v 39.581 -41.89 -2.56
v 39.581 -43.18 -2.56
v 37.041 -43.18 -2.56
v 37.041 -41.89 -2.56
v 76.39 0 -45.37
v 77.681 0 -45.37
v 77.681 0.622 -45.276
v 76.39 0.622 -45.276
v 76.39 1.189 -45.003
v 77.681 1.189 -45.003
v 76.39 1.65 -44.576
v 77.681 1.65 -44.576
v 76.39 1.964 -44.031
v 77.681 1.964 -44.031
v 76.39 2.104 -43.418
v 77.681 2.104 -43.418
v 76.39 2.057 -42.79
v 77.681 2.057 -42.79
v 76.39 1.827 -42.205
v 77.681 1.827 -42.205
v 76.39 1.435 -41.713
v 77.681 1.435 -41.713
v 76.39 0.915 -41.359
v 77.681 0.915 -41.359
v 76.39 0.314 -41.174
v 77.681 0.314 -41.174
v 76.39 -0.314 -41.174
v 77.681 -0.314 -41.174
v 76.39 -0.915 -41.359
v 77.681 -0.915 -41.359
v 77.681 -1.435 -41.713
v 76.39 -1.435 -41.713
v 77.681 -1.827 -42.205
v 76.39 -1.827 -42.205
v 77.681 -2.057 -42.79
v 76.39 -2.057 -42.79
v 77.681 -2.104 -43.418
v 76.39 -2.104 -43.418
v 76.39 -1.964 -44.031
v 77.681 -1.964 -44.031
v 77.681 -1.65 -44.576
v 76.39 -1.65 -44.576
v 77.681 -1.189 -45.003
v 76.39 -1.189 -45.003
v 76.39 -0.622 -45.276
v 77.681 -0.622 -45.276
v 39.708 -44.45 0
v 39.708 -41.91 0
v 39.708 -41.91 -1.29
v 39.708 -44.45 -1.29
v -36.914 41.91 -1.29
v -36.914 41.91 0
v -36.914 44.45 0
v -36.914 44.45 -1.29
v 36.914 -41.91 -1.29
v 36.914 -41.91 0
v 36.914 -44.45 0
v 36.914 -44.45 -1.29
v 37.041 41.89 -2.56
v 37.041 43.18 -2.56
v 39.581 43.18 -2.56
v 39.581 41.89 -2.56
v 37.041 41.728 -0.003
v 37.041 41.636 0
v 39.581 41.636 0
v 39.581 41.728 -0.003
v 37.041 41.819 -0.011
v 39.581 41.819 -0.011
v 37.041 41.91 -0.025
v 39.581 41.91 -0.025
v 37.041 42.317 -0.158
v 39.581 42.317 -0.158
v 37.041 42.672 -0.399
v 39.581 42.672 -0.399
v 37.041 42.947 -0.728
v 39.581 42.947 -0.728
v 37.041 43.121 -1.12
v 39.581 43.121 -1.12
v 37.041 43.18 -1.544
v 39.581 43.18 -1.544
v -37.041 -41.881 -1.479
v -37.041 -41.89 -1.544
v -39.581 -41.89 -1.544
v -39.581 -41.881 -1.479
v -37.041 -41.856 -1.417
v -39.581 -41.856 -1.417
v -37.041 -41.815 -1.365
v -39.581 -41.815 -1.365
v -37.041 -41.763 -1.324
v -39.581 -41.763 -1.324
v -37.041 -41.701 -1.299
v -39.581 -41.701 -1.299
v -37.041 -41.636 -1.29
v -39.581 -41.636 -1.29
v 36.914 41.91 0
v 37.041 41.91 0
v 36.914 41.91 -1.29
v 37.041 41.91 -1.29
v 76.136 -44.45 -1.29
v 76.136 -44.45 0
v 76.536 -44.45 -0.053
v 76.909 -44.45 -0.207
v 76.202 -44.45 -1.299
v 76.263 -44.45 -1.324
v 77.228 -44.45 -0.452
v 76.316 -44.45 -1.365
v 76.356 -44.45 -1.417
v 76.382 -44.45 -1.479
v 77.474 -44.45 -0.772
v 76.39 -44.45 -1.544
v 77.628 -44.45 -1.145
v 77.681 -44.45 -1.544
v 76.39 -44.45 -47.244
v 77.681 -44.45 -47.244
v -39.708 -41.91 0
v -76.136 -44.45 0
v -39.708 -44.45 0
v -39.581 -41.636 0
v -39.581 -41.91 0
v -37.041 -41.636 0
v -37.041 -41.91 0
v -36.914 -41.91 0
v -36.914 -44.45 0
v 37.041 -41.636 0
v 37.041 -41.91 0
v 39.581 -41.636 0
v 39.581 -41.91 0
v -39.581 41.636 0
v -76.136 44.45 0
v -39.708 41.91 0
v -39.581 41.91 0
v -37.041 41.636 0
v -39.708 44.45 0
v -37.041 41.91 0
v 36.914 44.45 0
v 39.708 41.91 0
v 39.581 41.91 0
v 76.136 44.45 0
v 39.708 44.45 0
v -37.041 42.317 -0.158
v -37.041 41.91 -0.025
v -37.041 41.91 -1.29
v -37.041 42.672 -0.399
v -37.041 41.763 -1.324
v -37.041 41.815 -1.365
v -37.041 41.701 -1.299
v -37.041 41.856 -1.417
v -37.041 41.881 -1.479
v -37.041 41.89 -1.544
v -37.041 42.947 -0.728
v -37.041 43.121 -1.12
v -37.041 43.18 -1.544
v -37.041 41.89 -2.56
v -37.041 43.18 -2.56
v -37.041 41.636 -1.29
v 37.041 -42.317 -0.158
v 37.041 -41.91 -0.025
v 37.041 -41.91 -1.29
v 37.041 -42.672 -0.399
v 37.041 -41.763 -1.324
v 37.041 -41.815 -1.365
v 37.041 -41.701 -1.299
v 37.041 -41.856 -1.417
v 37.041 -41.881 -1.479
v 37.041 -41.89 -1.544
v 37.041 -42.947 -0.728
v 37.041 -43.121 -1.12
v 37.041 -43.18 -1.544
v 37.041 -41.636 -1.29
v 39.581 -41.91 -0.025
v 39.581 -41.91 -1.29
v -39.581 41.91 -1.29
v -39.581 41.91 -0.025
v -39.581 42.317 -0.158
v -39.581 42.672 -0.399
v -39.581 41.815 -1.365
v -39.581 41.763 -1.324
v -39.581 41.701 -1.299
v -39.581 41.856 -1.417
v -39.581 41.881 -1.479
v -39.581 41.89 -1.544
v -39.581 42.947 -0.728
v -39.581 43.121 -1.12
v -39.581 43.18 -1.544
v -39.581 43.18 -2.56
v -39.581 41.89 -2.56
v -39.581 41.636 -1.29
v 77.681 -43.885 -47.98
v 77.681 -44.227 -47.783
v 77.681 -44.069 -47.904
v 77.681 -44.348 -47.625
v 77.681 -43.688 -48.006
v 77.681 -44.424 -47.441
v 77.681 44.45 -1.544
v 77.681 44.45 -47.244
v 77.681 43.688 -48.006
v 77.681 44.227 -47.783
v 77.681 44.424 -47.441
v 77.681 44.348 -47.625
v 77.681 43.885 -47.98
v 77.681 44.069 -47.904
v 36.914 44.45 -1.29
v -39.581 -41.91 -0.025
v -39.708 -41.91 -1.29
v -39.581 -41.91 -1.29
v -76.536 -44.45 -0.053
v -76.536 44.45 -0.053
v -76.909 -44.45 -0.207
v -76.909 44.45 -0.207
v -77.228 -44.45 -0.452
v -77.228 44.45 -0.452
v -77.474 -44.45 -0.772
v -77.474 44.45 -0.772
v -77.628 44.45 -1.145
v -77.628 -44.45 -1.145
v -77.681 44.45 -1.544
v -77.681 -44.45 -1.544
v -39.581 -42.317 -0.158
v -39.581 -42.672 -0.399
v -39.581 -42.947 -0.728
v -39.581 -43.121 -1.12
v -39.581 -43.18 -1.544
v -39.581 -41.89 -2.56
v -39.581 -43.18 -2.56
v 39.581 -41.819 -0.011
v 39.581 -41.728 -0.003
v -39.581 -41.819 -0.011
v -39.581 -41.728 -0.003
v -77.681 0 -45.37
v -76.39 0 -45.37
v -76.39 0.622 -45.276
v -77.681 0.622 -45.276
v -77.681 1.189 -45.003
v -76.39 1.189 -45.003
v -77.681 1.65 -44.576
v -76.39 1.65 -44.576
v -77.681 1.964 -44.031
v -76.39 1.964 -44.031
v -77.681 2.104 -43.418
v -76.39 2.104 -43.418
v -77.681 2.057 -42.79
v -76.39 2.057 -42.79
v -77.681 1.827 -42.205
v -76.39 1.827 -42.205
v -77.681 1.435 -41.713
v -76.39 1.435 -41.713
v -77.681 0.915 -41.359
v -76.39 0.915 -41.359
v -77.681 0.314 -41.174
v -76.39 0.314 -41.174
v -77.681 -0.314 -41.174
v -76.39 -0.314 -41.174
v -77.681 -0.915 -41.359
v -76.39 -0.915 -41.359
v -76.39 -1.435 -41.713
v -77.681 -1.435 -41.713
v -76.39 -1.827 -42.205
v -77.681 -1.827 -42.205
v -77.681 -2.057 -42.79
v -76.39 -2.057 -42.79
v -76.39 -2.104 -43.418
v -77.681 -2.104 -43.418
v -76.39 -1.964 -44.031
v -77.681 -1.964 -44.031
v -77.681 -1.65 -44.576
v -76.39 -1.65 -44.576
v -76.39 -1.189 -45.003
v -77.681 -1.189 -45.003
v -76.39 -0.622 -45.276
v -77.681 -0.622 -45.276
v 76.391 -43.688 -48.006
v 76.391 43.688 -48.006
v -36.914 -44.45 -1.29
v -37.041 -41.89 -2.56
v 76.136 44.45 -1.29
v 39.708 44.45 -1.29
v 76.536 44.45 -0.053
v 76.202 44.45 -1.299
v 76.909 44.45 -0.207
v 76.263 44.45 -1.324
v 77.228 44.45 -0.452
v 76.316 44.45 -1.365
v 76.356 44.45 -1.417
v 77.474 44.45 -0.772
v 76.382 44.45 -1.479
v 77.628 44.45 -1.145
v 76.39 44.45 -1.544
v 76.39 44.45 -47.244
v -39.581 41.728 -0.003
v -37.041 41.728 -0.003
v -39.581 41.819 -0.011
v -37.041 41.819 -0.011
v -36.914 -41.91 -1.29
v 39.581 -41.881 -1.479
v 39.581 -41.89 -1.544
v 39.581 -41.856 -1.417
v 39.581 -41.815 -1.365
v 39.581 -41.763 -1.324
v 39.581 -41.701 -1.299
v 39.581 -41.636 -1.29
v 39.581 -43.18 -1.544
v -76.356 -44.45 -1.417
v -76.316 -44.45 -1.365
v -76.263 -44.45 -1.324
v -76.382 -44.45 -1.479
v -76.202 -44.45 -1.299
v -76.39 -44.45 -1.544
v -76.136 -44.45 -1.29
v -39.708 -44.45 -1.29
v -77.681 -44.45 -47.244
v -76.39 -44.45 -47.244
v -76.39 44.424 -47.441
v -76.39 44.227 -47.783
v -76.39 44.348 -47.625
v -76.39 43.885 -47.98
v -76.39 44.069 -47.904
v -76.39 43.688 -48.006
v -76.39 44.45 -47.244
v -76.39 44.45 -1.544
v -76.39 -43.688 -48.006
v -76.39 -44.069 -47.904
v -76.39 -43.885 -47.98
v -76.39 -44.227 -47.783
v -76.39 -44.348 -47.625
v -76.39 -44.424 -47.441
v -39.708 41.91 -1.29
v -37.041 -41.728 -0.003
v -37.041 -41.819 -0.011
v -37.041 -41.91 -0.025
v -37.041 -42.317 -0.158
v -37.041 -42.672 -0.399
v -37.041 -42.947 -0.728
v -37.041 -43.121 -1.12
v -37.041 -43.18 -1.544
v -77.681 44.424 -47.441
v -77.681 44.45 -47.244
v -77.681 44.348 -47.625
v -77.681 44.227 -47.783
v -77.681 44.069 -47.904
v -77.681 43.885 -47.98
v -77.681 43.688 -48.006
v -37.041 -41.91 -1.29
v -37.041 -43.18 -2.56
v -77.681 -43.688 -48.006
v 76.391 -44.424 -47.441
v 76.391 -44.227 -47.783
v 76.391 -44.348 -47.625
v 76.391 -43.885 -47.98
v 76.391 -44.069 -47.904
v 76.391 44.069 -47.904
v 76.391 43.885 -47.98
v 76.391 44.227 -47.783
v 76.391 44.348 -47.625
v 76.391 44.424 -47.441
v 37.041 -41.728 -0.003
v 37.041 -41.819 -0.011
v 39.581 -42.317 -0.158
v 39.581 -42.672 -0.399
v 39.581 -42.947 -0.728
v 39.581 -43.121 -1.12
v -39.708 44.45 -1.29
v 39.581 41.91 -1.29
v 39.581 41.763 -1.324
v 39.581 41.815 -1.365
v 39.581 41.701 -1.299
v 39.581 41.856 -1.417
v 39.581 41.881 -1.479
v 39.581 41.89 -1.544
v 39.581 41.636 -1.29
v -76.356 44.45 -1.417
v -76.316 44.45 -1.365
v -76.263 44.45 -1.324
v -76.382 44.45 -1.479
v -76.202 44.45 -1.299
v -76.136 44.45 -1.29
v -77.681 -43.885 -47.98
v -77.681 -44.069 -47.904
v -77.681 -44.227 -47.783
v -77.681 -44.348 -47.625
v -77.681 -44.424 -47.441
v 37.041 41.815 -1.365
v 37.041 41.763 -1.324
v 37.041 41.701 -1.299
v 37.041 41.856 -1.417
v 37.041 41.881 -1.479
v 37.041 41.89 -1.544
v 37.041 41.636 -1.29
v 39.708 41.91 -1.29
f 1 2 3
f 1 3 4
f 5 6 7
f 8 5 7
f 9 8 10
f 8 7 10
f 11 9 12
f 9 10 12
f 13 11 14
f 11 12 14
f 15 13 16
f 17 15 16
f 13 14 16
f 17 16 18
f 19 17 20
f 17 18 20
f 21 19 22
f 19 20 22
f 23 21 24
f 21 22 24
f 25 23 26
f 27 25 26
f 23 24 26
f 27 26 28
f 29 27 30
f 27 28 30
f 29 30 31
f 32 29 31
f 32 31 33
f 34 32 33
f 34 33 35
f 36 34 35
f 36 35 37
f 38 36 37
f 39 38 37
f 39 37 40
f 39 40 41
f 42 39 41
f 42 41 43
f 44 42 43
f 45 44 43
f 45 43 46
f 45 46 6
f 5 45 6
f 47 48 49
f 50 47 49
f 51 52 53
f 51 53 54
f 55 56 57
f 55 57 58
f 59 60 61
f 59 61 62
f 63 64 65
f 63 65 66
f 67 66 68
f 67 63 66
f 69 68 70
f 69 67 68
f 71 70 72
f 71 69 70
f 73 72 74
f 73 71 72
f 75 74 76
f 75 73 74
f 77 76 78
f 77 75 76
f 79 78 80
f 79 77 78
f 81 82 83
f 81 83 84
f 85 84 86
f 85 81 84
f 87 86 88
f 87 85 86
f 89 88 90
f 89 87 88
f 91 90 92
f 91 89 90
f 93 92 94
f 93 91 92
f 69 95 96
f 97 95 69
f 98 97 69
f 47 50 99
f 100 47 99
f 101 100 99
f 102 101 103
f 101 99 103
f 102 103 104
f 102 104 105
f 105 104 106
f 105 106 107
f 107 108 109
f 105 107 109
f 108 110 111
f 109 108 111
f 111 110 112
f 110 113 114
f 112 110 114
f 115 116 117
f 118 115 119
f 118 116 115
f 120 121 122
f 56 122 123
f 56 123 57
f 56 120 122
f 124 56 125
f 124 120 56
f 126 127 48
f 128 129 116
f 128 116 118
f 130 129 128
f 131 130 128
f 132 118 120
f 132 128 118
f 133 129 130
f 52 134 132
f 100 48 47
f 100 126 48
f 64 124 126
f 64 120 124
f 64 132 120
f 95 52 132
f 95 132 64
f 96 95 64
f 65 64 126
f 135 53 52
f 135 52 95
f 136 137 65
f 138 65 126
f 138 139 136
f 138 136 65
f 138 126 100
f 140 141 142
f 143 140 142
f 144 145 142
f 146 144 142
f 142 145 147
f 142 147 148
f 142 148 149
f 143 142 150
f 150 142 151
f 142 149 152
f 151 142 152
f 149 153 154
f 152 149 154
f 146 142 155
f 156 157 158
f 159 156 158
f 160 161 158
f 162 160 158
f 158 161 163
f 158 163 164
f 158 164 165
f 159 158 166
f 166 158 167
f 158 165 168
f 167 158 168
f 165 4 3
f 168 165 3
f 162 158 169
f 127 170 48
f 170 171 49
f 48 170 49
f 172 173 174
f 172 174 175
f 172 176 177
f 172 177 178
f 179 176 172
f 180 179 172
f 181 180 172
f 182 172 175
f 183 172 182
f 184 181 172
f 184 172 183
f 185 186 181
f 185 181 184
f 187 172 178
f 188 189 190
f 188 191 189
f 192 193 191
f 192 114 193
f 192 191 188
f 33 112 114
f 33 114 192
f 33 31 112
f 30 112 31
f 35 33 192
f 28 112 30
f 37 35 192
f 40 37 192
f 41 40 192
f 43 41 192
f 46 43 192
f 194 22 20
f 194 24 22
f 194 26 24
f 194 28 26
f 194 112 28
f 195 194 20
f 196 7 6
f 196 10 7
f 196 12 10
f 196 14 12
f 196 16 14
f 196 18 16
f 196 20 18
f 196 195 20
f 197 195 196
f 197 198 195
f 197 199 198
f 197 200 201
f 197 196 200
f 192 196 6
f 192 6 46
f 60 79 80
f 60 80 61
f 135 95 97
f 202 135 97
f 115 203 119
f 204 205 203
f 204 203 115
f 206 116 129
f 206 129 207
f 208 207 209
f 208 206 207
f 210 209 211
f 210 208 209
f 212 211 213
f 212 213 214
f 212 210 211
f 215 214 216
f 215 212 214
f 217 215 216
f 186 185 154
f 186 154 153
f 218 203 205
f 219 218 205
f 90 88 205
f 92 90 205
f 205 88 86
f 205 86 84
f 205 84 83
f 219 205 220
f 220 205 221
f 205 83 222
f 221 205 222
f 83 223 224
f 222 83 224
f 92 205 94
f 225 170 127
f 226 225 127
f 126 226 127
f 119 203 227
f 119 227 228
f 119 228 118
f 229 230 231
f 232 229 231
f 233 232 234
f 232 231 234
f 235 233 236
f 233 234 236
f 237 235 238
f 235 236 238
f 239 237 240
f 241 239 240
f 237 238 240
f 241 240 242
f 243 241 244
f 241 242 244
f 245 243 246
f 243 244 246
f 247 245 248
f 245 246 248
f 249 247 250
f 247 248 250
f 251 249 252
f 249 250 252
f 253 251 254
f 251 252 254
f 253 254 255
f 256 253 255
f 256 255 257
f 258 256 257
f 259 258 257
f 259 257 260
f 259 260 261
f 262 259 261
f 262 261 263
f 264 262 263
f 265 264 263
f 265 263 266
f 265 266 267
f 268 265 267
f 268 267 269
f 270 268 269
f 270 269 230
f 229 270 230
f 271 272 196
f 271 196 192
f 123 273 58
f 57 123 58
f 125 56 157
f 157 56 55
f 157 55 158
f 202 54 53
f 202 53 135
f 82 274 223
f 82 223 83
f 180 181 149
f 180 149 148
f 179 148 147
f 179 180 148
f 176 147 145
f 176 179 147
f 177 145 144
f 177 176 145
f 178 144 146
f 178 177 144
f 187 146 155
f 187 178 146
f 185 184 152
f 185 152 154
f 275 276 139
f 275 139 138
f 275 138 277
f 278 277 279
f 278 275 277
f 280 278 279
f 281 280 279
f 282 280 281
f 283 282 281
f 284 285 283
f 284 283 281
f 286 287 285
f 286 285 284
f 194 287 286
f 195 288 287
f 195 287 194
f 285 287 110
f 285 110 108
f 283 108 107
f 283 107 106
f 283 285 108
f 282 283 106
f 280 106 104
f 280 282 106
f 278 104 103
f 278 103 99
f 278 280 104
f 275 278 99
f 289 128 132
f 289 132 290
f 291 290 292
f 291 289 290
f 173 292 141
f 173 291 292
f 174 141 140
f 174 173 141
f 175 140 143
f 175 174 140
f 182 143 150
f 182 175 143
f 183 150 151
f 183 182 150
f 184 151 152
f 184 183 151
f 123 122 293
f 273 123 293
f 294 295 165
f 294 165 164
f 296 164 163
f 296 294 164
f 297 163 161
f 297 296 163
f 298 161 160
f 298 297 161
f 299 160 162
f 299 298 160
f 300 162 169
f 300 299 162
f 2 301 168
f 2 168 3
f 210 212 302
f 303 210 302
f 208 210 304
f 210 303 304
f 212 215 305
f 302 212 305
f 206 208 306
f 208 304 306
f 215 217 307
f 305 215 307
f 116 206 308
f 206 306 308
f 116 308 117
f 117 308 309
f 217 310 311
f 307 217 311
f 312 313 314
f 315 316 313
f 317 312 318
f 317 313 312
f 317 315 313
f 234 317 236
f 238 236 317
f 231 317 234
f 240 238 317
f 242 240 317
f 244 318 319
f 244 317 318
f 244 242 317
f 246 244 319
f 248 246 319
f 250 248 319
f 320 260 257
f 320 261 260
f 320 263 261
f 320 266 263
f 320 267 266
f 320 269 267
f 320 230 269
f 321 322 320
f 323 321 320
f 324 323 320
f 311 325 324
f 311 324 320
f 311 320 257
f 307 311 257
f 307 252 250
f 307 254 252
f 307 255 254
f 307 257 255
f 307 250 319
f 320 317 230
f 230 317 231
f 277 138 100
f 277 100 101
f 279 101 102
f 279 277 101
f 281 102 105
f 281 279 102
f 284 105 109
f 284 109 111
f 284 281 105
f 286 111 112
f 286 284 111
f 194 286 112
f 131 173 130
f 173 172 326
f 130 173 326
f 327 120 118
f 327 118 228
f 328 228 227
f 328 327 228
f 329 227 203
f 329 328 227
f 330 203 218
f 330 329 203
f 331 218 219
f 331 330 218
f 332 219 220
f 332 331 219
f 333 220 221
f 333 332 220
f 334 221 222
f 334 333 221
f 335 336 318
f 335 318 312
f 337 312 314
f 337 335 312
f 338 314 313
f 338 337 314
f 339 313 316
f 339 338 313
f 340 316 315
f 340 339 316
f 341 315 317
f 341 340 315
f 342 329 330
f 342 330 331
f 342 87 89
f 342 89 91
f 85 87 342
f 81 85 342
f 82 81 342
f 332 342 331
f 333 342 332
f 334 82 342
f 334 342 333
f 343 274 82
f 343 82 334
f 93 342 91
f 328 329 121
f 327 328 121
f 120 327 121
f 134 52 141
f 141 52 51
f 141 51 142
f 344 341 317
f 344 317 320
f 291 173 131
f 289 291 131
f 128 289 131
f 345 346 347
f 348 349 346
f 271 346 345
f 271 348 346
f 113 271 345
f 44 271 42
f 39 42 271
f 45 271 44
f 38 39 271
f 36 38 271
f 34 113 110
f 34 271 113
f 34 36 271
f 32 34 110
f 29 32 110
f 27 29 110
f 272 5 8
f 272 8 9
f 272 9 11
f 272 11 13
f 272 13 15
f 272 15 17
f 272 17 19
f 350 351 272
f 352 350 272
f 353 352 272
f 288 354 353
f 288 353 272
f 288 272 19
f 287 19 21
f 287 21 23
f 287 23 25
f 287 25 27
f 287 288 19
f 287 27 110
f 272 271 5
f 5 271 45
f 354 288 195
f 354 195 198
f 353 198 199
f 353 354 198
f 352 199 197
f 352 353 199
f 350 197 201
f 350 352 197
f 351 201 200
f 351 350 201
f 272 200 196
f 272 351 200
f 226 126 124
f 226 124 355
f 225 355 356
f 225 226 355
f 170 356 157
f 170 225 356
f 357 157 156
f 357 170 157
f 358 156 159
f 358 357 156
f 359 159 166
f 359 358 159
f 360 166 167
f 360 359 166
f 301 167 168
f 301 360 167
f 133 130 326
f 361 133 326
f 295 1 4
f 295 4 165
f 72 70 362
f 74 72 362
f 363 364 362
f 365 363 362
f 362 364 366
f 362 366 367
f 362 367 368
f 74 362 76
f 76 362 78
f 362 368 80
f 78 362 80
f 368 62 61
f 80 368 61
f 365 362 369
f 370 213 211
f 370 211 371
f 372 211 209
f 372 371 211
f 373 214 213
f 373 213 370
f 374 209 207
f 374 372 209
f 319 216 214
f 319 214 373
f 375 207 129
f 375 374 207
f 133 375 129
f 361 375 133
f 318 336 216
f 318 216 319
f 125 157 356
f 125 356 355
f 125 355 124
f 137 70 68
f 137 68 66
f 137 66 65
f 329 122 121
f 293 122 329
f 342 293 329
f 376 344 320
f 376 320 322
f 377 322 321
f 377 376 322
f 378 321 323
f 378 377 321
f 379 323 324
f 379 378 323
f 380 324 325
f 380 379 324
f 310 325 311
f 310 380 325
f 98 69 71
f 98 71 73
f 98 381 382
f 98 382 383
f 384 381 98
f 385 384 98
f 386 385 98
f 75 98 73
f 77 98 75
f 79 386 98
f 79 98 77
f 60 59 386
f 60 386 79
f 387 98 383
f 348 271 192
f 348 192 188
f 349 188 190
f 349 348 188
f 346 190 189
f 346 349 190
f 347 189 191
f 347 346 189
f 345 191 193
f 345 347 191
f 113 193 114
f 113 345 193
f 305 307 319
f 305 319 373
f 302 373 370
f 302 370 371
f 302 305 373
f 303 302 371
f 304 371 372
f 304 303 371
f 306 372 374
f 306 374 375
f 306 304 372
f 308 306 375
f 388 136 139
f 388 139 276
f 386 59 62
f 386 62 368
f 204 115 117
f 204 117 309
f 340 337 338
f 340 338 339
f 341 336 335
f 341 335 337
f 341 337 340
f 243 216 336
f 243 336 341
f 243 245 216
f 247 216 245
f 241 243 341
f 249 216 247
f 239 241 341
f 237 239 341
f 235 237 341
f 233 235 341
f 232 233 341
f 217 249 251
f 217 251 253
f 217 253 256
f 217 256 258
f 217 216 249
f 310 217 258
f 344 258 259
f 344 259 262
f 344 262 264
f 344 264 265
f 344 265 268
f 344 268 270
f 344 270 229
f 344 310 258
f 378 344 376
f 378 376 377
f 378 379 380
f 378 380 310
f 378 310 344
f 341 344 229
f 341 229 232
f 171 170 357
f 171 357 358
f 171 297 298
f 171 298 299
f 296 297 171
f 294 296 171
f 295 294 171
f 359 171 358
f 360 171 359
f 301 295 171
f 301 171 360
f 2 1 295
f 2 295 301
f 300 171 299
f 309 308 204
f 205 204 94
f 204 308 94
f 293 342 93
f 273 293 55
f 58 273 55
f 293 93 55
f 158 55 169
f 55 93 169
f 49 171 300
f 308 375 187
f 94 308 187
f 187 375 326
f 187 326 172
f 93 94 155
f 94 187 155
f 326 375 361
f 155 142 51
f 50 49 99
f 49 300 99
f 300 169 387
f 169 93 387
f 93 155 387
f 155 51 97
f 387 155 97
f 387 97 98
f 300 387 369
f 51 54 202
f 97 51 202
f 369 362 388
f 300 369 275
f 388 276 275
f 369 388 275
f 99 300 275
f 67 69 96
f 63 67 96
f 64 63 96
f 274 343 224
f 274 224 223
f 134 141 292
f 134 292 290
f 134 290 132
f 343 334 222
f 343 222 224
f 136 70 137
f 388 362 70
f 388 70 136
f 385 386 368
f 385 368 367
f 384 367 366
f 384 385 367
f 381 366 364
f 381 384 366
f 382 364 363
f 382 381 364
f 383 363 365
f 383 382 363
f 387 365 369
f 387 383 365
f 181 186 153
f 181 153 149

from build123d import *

# Parameters (mm, degrees)
SKETCH1_W                                    = 152.4
SKETCH1_H                                    = 88.9
BASE_FLANGE1_DEPTH                           = 1.29032
EDGE_FLANGE1_STRIP_W                         = 5.85978
EDGE_FLANGE1_STRIP_H                         = 1.29032
EDGE_FLANGE1_STRIP_CUT_DEPTH                 = 88.9
EDGE_FLANGE1_STRIP_2_W                       = 5.85978
EDGE_FLANGE1_STRIP_2_H                       = 1.29032
EDGE_FLANGE1_STRIP_CUT_2_DEPTH               = 88.9
EDGE_FLANGE1_DEPTH                           = 88.9
EDGE_FLANGE1_BEND_DEPTH                      = 88.9
F_4_22MM_HOLE_FOR_M3_CLINCH_NUT_D            = 4.22
BREAK_CORNER1_START                          = -77.68082
BREAK_CORNER1_DEPTH                          = 155.36164
CUT_THICKEN1_START                           = 41.91
CUT_THICKEN1_OUTLINE_W                       = 0.127
CUT_THICKEN1_OUTLINE_H                       = 1.29032
CUT_THICKEN1_DEPTH                           = 2.54
CUT_THICKEN2_START                           = 41.91
CUT_THICKEN2_OUTLINE_W                       = 0.127
CUT_THICKEN2_OUTLINE_H                       = 1.29032
CUT_THICKEN2_DEPTH                           = 2.54
MIRROR7_START                                = 41.91
MIRROR7_COPY_1_SKETCH_W                      = 0.127
MIRROR7_COPY_1_SKETCH_H                      = 1.29032
MIRROR7_COPY_1_DEPTH                         = 2.54
MIRROR7_COPY_2_SKETCH_W                      = 0.127
MIRROR7_COPY_2_SKETCH_H                      = 1.29032
MIRROR7_COPY_2_DEPTH                         = 2.54
MOVE_FACE1_BY                                = 1.27
MOVE_FACE1_2_BY                              = 1.27
MOVE_FACE1_3_BY                              = 1.27
MOVE_FACE1_4_BY                              = 1.27
EDGE_FLANGE2_STRIP_W                         = 5.66928
EDGE_FLANGE2_STRIP_H                         = 1.29032
EDGE_FLANGE2_STRIP_CUT_DEPTH                 = 2.54
EDGE_FLANGE2_STRIP_2_W                       = 5.66928
EDGE_FLANGE2_STRIP_2_H                       = 1.29032
EDGE_FLANGE2_STRIP_CUT_2_DEPTH               = 2.54
EDGE_FLANGE2_STRIP_3_W                       = 5.66928
EDGE_FLANGE2_STRIP_3_H                       = 1.29032
EDGE_FLANGE2_STRIP_CUT_3_DEPTH               = 2.54
EDGE_FLANGE2_STRIP_4_W                       = 5.66928
EDGE_FLANGE2_STRIP_4_H                       = 1.29032
EDGE_FLANGE2_STRIP_CUT_4_DEPTH               = 2.54
EDGE_FLANGE2_DEPTH                           = 2.54
EDGE_FLANGE2_BEND_DEPTH                      = 2.54
EDGE_FLANGE2_BEND_2_DEPTH                    = 2.54
EDGE_FLANGE2_BEND_3_DEPTH                    = 2.54
CHANGE_START                                 = -77.68082
CHANGE_NOTE_FOR_REVH_TO_ADD_010_CLEARA_DEPTH = 155.36164


# Read off the part's stored shape, not the designer's step: Break-Corner1, Cut-Thicken1, Cut-Thicken2, change note for revH to add .010" clearance
# Sheet-metal steps are written as plain solids
with BuildPart() as part:
    # Sketch1 → Base-Flange1 (new body)
    with BuildSketch(Plane.XY):
        Rectangle(SKETCH1_W, SKETCH1_H)
    extrude(amount=-BASE_FLANGE1_DEPTH)

    # Edge-Flange1 strip (across the edge) → Edge-Flange1 strip cut (cut)
    with BuildSketch(Plane(origin=(-76.3905, -44.45, -1.29032), x_dir=(1, 0, 0), z_dir=(0, 1, 0))):
        with Locations((-2.67589, -0.64516)):
            Rectangle(EDGE_FLANGE1_STRIP_W, EDGE_FLANGE1_STRIP_H)
    extrude(amount=EDGE_FLANGE1_STRIP_CUT_DEPTH, mode=Mode.SUBTRACT)

    # Edge-Flange1 strip 2 (across the edge) → Edge-Flange1 strip cut 2 (cut)
    with BuildSketch(Plane(origin=(76.3905, 44.45, -1.29032), x_dir=(-1, 0, 0), z_dir=(0, -1, 0))):
        with Locations((-2.67589, -0.64516)):
            Rectangle(EDGE_FLANGE1_STRIP_2_W, EDGE_FLANGE1_STRIP_2_H)
    extrude(amount=EDGE_FLANGE1_STRIP_CUT_2_DEPTH, mode=Mode.SUBTRACT)

    # Edge-Flange1 section (across the edge) → Edge-Flange1 (add)
    with BuildSketch(Plane(origin=(-76.3905, -44.45, -1.29032), x_dir=(1, 0, 0), z_dir=(0, 1, 0))):
        with BuildLine():
            Line((-1.29032, 0.254), (-1.29032, 46.96968))
            Line((-1.29032, 46.96968), (0, 46.96968))
            Line((0, 46.96968), (0, 0.254))
            ThreePointArc((0, 0.254), (0.074394878, 0.074394878), (0.254, 0))
            Line((0.254, 0), (0.254, -1.29032))
            ThreePointArc((0.254, -1.29032), (-0.837999144, -0.837999144), (-1.29032, 0.254))
        make_face()
    extrude(amount=EDGE_FLANGE1_DEPTH)

    # Edge-Flange1 section 2 (across the edge) → Edge-Flange1 bend (add)
    with BuildSketch(Plane(origin=(76.3905, 44.45, -1.29032), x_dir=(-1, 0, 0), z_dir=(0, -1, 0))):
        with BuildLine():
            Line((-1.29032, 0.254), (-1.29032, 46.96968))
            Line((-1.29032, 46.96968), (0, 46.96968))
            Line((0, 46.96968), (0, 0.254))
            ThreePointArc((0, 0.254), (0.074394878, 0.074394878), (0.254, 0))
            Line((0.254, 0), (0.254, -1.29032))
            ThreePointArc((0.254, -1.29032), (-0.837999144, -0.837999144), (-1.29032, 0.254))
        make_face()
    extrude(amount=EDGE_FLANGE1_BEND_DEPTH)

    # Ø4.22mm hole for M3 Clinch nut (through all)
    with Locations(Plane.ZY.offset(77.68082)):
        with Locations((-43.26, 0)):
            f_4_22mm_hole_for_m3_clinch_nut = Hole(F_4_22MM_HOLE_FOR_M3_CLINCH_NUT_D / 2)

    # Mirror1: Ø4.22mm hole for M3 Clinch nut across plane
    add(f_4_22mm_hole_for_m3_clinch_nut.mirror(Plane(origin=(0, 0, 0), x_dir=(0, 0, 1), z_dir=(1, 0, 0))), mode=Mode.SUBTRACT)

    # Break-Corner1 outline → Break-Corner1 (cut)
    with BuildSketch(Plane.YZ.offset(BREAK_CORNER1_START)):
        with BuildLine():
            Line((44.45, -48.26), (44.45, -47.498))
            ThreePointArc((44.45, -47.498), (44.226815367, -48.036815367), (43.688, -48.26))
            Line((43.688, -48.26), (44.45, -48.26))
        make_face()
        with BuildLine():
            Line((-44.45, -48.26), (-43.688, -48.26))
            ThreePointArc((-43.688, -48.26), (-44.226815367, -48.036815367), (-44.45, -47.498))
            Line((-44.45, -47.498), (-44.45, -48.26))
        make_face()
    extrude(amount=BREAK_CORNER1_DEPTH, mode=Mode.SUBTRACT)

    # Cut-Thicken1 outline → Cut-Thicken1 (cut)
    with BuildSketch(Plane(origin=(0, 0, 0), x_dir=(1, 0, 0), z_dir=(0, 1, 0)).offset(CUT_THICKEN1_START)):
        with Locations((36.97732, 0.64516)):
            Rectangle(CUT_THICKEN1_OUTLINE_W, CUT_THICKEN1_OUTLINE_H)
    cut_thicken1 = extrude(amount=CUT_THICKEN1_DEPTH, mode=Mode.SUBTRACT)

    # Cut-Thicken2 outline → Cut-Thicken2 (cut)
    with BuildSketch(Plane(origin=(0, 0, 0), x_dir=(1, 0, 0), z_dir=(0, 1, 0)).offset(CUT_THICKEN2_START)):
        with Locations((39.64432, 0.64516)):
            Rectangle(CUT_THICKEN2_OUTLINE_W, CUT_THICKEN2_OUTLINE_H)
    cut_thicken2 = extrude(amount=CUT_THICKEN2_DEPTH, mode=Mode.SUBTRACT)

    # Mirror6: Cut-Thicken1, Cut-Thicken2 across plane
    add(cut_thicken1.mirror(Plane(origin=(0, 0, 0), x_dir=(0, 0, 1), z_dir=(1, 0, 0))), mode=Mode.SUBTRACT)
    add(cut_thicken2.mirror(Plane(origin=(0, 0, 0), x_dir=(0, 0, 1), z_dir=(1, 0, 0))), mode=Mode.SUBTRACT)

    # Mirror7: Cut-Thicken1, Cut-Thicken2 across plane
    add(cut_thicken1.mirror(Plane.ZX), mode=Mode.SUBTRACT)
    add(cut_thicken2.mirror(Plane.ZX), mode=Mode.SUBTRACT)

    # Mirror7 copy 1 sketch → Mirror7 copy 1 (cut)
    with BuildSketch(Plane(origin=(0, 0, 0), x_dir=(-1, 0, 0), z_dir=(0, -1, 0)).offset(MIRROR7_START)):
        with Locations((36.97732, 0.64516)):
            Rectangle(MIRROR7_COPY_1_SKETCH_W, MIRROR7_COPY_1_SKETCH_H)
    extrude(amount=MIRROR7_COPY_1_DEPTH, mode=Mode.SUBTRACT)

    # Mirror7 copy 2 sketch → Mirror7 copy 2 (cut)
    with BuildSketch(Plane(origin=(0, 0, 0), x_dir=(-1, 0, 0), z_dir=(0, -1, 0)).offset(MIRROR7_START)):
        with Locations((39.64432, 0.64516)):
            Rectangle(MIRROR7_COPY_2_SKETCH_W, MIRROR7_COPY_2_SKETCH_H)
    extrude(amount=MIRROR7_COPY_2_DEPTH, mode=Mode.SUBTRACT)

    # Move Face1: a face moved inward by 1.27
    extrude(part.faces().sort_by_distance((-38.31082, -44.45, -0.64516))[0], amount=MOVE_FACE1_BY, dir=(0, 1, 0), mode=Mode.SUBTRACT)

    # Move Face1 2: a face moved inward by 1.27
    extrude(part.faces().sort_by_distance((38.31082, -44.45, -0.64516))[0], amount=MOVE_FACE1_2_BY, dir=(0, 1, 0), mode=Mode.SUBTRACT)

    # Move Face1 3: a face moved inward by 1.27
    extrude(part.faces().sort_by_distance((-38.31082, 44.45, -0.64516))[0], amount=MOVE_FACE1_3_BY, dir=(0, -1, 0), mode=Mode.SUBTRACT)

    # Move Face1 4: a face moved inward by 1.27
    extrude(part.faces().sort_by_distance((38.31082, 44.45, -0.64516))[0], amount=MOVE_FACE1_4_BY, dir=(0, -1, 0), mode=Mode.SUBTRACT)

    # Edge-Flange2 strip (across the edge) → Edge-Flange2 strip cut (cut)
    with BuildSketch(Plane(origin=(37.04082, 43.18, -1.29032), x_dir=(0, -1, 0), z_dir=(1, 0, 0))):
        with Locations((-1.29032, -0.64516)):
            Rectangle(EDGE_FLANGE2_STRIP_W, EDGE_FLANGE2_STRIP_H)
    extrude(amount=EDGE_FLANGE2_STRIP_CUT_DEPTH, mode=Mode.SUBTRACT)

    # Edge-Flange2 strip 2 (across the edge) → Edge-Flange2 strip cut 2 (cut)
    with BuildSketch(Plane(origin=(-39.58082, 43.18, -1.29032), x_dir=(0, -1, 0), z_dir=(1, 0, 0))):
        with Locations((-1.29032, -0.64516)):
            Rectangle(EDGE_FLANGE2_STRIP_2_W, EDGE_FLANGE2_STRIP_2_H)
    extrude(amount=EDGE_FLANGE2_STRIP_CUT_2_DEPTH, mode=Mode.SUBTRACT)

    # Edge-Flange2 strip 3 (across the edge) → Edge-Flange2 strip cut 3 (cut)
    with BuildSketch(Plane(origin=(39.58082, -43.18, -1.29032), x_dir=(0, 1, 0), z_dir=(-1, 0, 0))):
        with Locations((-1.29032, -0.64516)):
            Rectangle(EDGE_FLANGE2_STRIP_3_W, EDGE_FLANGE2_STRIP_3_H)
    extrude(amount=EDGE_FLANGE2_STRIP_CUT_3_DEPTH, mode=Mode.SUBTRACT)

    # Edge-Flange2 strip 4 (across the edge) → Edge-Flange2 strip cut 4 (cut)
    with BuildSketch(Plane(origin=(-37.04082, -43.18, -1.29032), x_dir=(0, 1, 0), z_dir=(-1, 0, 0))):
        with Locations((-1.29032, -0.64516)):
            Rectangle(EDGE_FLANGE2_STRIP_4_W, EDGE_FLANGE2_STRIP_4_H)
    extrude(amount=EDGE_FLANGE2_STRIP_CUT_4_DEPTH, mode=Mode.SUBTRACT)

    # Edge-Flange2 section (across the edge) → Edge-Flange2 (add)
    with BuildSketch(Plane(origin=(37.04082, 43.18, -1.29032), x_dir=(0, -1, 0), z_dir=(1, 0, 0))):
        with BuildLine():
            Line((0, 0.254), (0, 1.27))
            Line((0, 1.27), (1.29032, 1.27))
            Line((1.29032, 1.27), (1.29032, 0.254))
            ThreePointArc((1.29032, 0.254), (1.364714878, 0.074394878), (1.54432, 0))
            Line((1.54432, 0), (1.54432, -1.29032))
            ThreePointArc((1.54432, -1.29032), (0.452320856, -0.837999144), (0, 0.254))
        make_face()
    extrude(amount=EDGE_FLANGE2_DEPTH)

    # Edge-Flange2 section 2 (across the edge) → Edge-Flange2 bend (add)
    with BuildSketch(Plane(origin=(-39.58082, 43.18, -1.29032), x_dir=(0, -1, 0), z_dir=(1, 0, 0))):
        with BuildLine():
            Line((0, 0.254), (0, 1.27))
            Line((0, 1.27), (1.29032, 1.27))
            Line((1.29032, 1.27), (1.29032, 0.254))
            ThreePointArc((1.29032, 0.254), (1.364714878, 0.074394878), (1.54432, 0))
            Line((1.54432, 0), (1.54432, -1.29032))
            ThreePointArc((1.54432, -1.29032), (0.452320856, -0.837999144), (0, 0.254))
        make_face()
    extrude(amount=EDGE_FLANGE2_BEND_DEPTH)

    # Edge-Flange2 section 3 (across the edge) → Edge-Flange2 bend 2 (add)
    with BuildSketch(Plane(origin=(39.58082, -43.18, -1.29032), x_dir=(0, 1, 0), z_dir=(-1, 0, 0))):
        with BuildLine():
            Line((0, 0.254), (0, 1.27))
            Line((0, 1.27), (1.29032, 1.27))
            Line((1.29032, 1.27), (1.29032, 0.254))
            ThreePointArc((1.29032, 0.254), (1.364714878, 0.074394878), (1.54432, 0))
            Line((1.54432, 0), (1.54432, -1.29032))
            ThreePointArc((1.54432, -1.29032), (0.452320856, -0.837999144), (0, 0.254))
        make_face()
    extrude(amount=EDGE_FLANGE2_BEND_2_DEPTH)

    # Edge-Flange2 section 4 (across the edge) → Edge-Flange2 bend 3 (add)
    with BuildSketch(Plane(origin=(-37.04082, -43.18, -1.29032), x_dir=(0, 1, 0), z_dir=(-1, 0, 0))):
        with BuildLine():
            Line((0, 0.254), (0, 1.27))
            Line((0, 1.27), (1.29032, 1.27))
            Line((1.29032, 1.27), (1.29032, 0.254))
            ThreePointArc((1.29032, 0.254), (1.364714878, 0.074394878), (1.54432, 0))
            Line((1.54432, 0), (1.54432, -1.29032))
            ThreePointArc((1.54432, -1.29032), (0.452320856, -0.837999144), (0, 0.254))
        make_face()
    extrude(amount=EDGE_FLANGE2_BEND_3_DEPTH)

    # change note for revH to add .010_ cl 2 → change note for revH to add .010" clearance (cut)
    with BuildSketch(Plane.YZ.offset(CHANGE_START)):
        with BuildLine():
            Line((43.688, -48.006), (-43.688, -48.006))
            ThreePointArc((-43.688, -48.006), (-44.226815367, -47.782815367), (-44.45, -47.244))
            Line((-44.45, -47.244), (-44.45, -47.498))
            ThreePointArc((-44.45, -47.498), (-44.226815367, -48.036815367), (-43.688, -48.26))
            Line((-43.688, -48.26), (43.688, -48.26))
            ThreePointArc((43.688, -48.26), (44.226815367, -48.036815367), (44.45, -47.498))
            Line((44.45, -47.498), (44.45, -47.244))
            ThreePointArc((44.45, -47.244), (44.226815367, -47.782815367), (43.688, -48.006))
        make_face()
    extrude(amount=CHANGE_NOTE_FOR_REVH_TO_ADD_010_CLEARA_DEPTH, mode=Mode.SUBTRACT)


solid = part.part
